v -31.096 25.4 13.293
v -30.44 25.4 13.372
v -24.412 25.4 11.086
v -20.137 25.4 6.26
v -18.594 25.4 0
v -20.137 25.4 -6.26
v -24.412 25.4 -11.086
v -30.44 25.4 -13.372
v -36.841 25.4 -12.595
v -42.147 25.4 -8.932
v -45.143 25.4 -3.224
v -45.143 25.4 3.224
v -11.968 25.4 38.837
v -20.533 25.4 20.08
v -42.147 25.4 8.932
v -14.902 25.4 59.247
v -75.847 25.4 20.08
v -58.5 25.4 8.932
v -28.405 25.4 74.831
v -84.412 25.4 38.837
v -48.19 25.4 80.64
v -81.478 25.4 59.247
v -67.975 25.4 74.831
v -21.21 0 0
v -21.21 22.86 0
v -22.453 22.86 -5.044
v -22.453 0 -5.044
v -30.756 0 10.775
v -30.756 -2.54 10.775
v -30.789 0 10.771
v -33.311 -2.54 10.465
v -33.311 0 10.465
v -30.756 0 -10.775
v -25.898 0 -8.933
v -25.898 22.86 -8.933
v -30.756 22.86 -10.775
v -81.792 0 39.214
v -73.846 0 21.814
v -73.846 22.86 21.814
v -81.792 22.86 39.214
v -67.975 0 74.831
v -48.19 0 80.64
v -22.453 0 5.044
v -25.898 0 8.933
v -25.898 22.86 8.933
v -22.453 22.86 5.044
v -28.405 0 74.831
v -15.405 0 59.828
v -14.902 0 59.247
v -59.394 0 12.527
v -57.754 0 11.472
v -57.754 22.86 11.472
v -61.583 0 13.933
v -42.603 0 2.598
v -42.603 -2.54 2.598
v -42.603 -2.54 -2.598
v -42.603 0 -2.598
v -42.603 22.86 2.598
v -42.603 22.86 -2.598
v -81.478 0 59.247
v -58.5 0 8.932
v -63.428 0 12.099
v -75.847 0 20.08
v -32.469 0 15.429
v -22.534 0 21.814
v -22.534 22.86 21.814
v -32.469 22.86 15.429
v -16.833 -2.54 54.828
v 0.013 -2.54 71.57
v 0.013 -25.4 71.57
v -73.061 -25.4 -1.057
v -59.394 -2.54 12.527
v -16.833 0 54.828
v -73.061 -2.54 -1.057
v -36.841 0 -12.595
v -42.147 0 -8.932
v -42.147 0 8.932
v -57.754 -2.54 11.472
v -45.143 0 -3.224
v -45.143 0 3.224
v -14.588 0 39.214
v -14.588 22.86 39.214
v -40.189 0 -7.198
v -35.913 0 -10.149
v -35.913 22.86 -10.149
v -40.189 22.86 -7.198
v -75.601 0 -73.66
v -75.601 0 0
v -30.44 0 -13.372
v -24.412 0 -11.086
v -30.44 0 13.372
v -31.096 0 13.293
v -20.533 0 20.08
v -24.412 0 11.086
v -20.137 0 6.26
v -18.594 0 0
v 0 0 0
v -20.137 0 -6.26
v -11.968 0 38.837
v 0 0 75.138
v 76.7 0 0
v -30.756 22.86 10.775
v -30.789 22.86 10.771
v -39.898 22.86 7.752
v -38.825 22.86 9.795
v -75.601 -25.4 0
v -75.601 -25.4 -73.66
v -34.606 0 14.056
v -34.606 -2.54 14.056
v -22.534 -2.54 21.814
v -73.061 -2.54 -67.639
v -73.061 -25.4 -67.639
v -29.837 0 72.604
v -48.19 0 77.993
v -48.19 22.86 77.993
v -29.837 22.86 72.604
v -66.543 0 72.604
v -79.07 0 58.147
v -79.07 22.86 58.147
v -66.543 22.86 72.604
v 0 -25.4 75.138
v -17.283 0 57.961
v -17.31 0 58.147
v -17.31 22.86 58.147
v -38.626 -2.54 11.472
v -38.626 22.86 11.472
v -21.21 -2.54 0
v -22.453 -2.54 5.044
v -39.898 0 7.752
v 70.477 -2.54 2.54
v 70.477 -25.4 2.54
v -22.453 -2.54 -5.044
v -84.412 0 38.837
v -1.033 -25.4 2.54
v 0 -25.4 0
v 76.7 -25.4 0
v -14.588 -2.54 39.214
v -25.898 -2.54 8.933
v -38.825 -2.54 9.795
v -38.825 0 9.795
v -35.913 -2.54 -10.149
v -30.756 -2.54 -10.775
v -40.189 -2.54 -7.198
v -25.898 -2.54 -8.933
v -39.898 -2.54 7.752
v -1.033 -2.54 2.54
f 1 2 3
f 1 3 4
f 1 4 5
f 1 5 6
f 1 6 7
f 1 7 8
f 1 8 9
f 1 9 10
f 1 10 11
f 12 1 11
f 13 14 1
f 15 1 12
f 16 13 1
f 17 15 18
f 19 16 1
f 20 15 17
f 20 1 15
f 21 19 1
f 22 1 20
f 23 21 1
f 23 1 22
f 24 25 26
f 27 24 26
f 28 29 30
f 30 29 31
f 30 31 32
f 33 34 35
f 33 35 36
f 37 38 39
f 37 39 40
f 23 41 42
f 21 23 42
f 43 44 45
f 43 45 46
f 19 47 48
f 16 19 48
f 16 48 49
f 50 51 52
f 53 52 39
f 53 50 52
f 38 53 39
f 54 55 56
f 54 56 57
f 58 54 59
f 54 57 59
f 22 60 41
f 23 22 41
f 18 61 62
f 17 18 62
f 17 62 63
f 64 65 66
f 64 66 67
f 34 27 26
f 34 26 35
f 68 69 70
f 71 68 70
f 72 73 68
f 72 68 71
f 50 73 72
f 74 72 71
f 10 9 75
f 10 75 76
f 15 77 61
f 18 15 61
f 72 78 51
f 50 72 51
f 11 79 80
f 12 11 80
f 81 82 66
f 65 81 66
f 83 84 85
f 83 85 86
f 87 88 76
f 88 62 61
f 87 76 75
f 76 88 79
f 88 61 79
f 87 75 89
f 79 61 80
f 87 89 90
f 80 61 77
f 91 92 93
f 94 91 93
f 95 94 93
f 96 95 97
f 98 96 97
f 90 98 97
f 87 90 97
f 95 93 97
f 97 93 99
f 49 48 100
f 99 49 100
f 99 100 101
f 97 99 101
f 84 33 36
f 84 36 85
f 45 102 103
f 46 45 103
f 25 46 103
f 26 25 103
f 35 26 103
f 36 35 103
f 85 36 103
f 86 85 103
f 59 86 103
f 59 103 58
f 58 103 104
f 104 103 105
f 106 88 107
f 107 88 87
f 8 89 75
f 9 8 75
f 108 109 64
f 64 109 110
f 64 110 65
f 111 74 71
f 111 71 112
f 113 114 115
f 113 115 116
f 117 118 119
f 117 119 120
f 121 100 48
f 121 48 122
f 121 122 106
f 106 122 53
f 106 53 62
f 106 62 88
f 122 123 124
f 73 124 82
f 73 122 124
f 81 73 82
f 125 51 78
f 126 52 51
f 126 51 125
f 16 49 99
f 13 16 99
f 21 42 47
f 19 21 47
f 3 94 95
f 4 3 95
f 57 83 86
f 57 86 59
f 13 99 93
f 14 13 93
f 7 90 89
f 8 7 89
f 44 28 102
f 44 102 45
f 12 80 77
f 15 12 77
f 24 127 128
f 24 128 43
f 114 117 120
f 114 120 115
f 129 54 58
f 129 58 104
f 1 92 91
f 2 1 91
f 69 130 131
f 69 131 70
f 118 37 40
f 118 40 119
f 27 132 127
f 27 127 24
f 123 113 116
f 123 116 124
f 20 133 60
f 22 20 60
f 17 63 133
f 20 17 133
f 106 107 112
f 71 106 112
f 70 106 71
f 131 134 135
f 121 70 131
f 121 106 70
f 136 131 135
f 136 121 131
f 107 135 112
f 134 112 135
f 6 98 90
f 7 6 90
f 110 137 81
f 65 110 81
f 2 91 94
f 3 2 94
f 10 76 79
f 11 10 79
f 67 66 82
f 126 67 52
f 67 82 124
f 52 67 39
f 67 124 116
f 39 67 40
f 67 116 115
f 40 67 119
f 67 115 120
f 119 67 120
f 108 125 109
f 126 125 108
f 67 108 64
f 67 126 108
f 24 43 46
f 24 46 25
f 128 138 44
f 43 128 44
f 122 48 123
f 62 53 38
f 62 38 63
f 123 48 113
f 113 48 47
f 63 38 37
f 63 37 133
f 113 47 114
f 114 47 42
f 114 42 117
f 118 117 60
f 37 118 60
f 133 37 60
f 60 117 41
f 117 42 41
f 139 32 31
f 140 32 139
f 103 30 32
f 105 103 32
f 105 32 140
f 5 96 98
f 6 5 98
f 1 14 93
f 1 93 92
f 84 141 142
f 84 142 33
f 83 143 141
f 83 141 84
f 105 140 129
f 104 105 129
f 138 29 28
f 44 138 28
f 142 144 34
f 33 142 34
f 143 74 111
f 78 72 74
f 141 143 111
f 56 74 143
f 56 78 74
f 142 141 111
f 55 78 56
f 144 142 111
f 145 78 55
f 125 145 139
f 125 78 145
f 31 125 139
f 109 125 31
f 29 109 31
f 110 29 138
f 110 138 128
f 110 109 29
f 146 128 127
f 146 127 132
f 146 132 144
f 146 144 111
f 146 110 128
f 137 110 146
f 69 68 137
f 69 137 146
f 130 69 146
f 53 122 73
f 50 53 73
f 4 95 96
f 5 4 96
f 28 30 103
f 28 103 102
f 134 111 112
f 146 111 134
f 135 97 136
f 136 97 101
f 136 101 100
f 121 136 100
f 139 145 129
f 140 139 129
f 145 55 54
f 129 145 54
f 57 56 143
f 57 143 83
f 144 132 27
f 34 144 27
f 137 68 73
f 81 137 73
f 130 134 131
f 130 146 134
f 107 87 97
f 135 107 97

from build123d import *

# Parameters (mm, degrees)
F1_DEPTH     = 25.4
F2_T         = -2.54
F4_DEPTH     = 25.4
F5_T         = 2.54
F5_T3_DEPTH  = 30.48
F5_T5_DEPTH  = 10.9375095944
F5_T7_DEPTH  = 21.4331791904
F5_T9_DEPTH  = 11.5273250997
F5_T11_DEPTH = 11.5273250997
F5_T13_DEPTH = 11.5273250997
F5_T15_DEPTH = 11.5273250997
F5_T17_DEPTH = 11.5273250997
F5_T19_DEPTH = 11.5273250997
F5_T21_DEPTH = 11.5273250997
F5_T23_DEPTH = 11.5273250997
F5_T25_DEPTH = 11.5273250997
F5_T27_DEPTH = 11.5273250997
F5_T29_DEPTH = 11.5273250997
F5_T31_DEPTH = 5.7399744024
F5_T33_DEPTH = 17.6352883916
F5_T35_DEPTH = 25.6999516571
F5_T37_DEPTH = 25.6999516571
F5_T39_DEPTH = 5.8481406641
F5_T41_DEPTH = 30.48
F5_T43_DEPTH = 27.94


# Not quite as in the source:
# - a shell that OpenCascade refuses in one call is made with other operations: the cavity is built on its own and cut out


with BuildPart() as f1:
    # F0 (on Front) → F1 (new body)
    with BuildSketch(Plane.XZ):
        Polygon((76.6998529434, 0), (0, 75.1383975148), (-75.6014883518, 0), (-75.6014883518, -73.6595392227), (0, 0), align=None)
    extrude(amount=F1_DEPTH)

    # F2
    f2_openings = [f1.faces().sort_by_distance(p)[0] for p in [
        (-16.251734, -25.4, 8.81054),
    ]]
    offset(amount=F2_T, openings=f2_openings, kind=Kind.INTERSECTION)

    # F3 (on face) → F4 (join)
    with BuildSketch(Plane(origin=(0, 0, 0), x_dir=(-1, 0, 0), z_dir=(0, 1, 0))):
        Polygon((45.1430156827, -3.2236625498), (45.1430156827, 3.2236625498), (42.1467943112, 8.9324854087), (37.8800218445, 8.9324854087), (31.0955953813, 13.2925715491), (30.4404329353, 13.3721226726), (24.4120792452, 11.0858696839), (20.1367118865, 6.2599775498), (18.5937659974, 0), (20.1367118865, -6.2599775498), (24.4120792452, -11.0858696839), (30.4404329353, -13.3721226726), (36.8407497759, -12.5949835086), (42.1467943112, -8.9324854087), align=None)
        Polygon((37.8800218445, 8.9324854087), (42.1467943112, 8.9324854087), (36.8407497759, 12.5949835086), (31.0955953813, 13.2925715491), align=None)
        Polygon((36.8407497759, 12.5949835086), (42.1467943112, 8.9324854087), (58.4999735016, 8.9324854087), (75.8465806799, 20.0804729285), (84.4124181657, 38.8370406985), (81.4778930804, 59.2471109792), (67.9746964043, 74.8306306673), (48.189997673, 80.6399423696), (28.4052989418, 74.8306306673), (14.9021022657, 59.2471109792), (11.9675771804, 38.8370406985), (20.5334146661, 20.0804729285), (31.0955953813, 13.2925715491), align=None)
    extrude(amount=F4_DEPTH)

    # F5: shell of thickness 2.54, made by hand


with BuildPart() as f5_core1:
    # F5_t2: copy of F1
    add(f1.part)

    # the walls: a layer under each face that stays
    f5_faces = [f5_core1.faces().sort_by_distance(p)[0] for p in [
        (38.3499264717, -12.7, 37.5691987574),
        (38.3499264717, -12.7, 0),
        (-37.8007441759, -12.7, 37.5691987574),
        (0.5491822958, 0, 0.7394291461),
        (0.5491822958, -25.4, 0.7394291461),
        (-37.8007441759, -12.7, -36.8297696114),
        (-75.6014883518, -12.7, -36.8297696114),
        (-67.1732770908, 12.7, 14.5064791686),
        (-50.3233839064, 12.7, 8.9324854087),
        (-43.6449049969, 12.7, 6.0780739793),
        (-45.1430156827, 12.7, 0),
        (-43.6449049969, 12.7, -6.0780739793),
        (-39.4937720436, 12.7, -10.7637344586),
        (-33.6405913556, 12.7, -12.9835530906),
        (-27.4262560902, 12.7, -12.2289961783),
        (-22.2743955659, 12.7, -8.6729236169),
        (-19.365238942, 12.7, -3.1299887749),
        (-19.365238942, 12.7, 3.1299887749),
        (-22.2743955659, 12.7, 8.6729236169),
        (-27.4262560902, 12.7, 12.2289961783),
        (-30.7680141583, 12.7, 13.3323471109),
        (-25.8145050237, 12.7, 16.6865222388),
        (-16.2504959233, 12.7, 29.4587568135),
        (-13.434839723, 12.7, 49.0420758389),
        (-21.6537006037, 12.7, 67.0388708233),
        (35.245158445, -13.97, 37.0550334809),
        (34.7223268727, -13.97, 2.54),
        (-37.0471427298, -13.97, -32.5492576556),
        (-73.0614883518, -13.97, -34.3475958286),
        (-36.5243111575, -13.97, 35.2566953079),
        (-38.2976483074, 12.7, 77.7352865185),
        (-58.0823470387, 12.7, 77.7352865185),
        (-74.7262947424, 12.7, 67.0388708233),
        (-82.945155623, 12.7, 49.0420758389),
        (-80.1294994228, 12.7, 29.4587568135),
        (-48.189997673, 25.4, 33.6339098485),
    ]]
    thicken(f5_faces, amount=-F5_T, mode=Mode.SUBTRACT)

    # F5_s4 → F5_t3 (cut)
    with BuildSketch(Plane.XZ.offset(-2.54)):
        Polygon((0.0177253382, -0.0435926464), (0, 2.54), (-1.0327971077, 2.54), (-1.7725338247, 1.8192646427), align=None)
    extrude(amount=F5_T3_DEPTH, mode=Mode.SUBTRACT)

    # F5_s6 → F5_t5 (cut)
    with BuildSketch(Plane(origin=(-43.3267236667, 0, 27.8443945691), x_dir=(0, 1, 0), z_dir=(-0.8412535328, 0, 0.5406408175))):
        Polygon((0.0254, 24.138388588), (-2.54, 24.112988588), (-2.54, 21.572988588), (0, 21.572988588), align=None)
    extrude(amount=F5_T5_DEPTH, mode=Mode.SUBTRACT)

    # F5_s8 → F5_t7 (cut)
    with BuildSketch(Plane.YZ.offset(-61.0399735016)):
        Polygon((0.0254, 8.9070854087), (-2.54, 8.9324854087), (-2.54, 11.4724854087), (0, 11.4724854087), align=None)
    extrude(amount=F5_T7_DEPTH, mode=Mode.SUBTRACT)

    # F5_s10 → F5_t9 (cut)
    with BuildSketch(Plane(origin=(-9.6033156793, 0, -18.2975892876), x_dir=(0, 1, 0), z_dir=(0.464723172, 0, 0.8854560257))):
        Polygon((0.0254, 41.4956659382), (-2.54, 41.4702659382), (-2.54, 38.9302659382), (0, 38.9302659382), align=None)
    extrude(amount=F5_T9_DEPTH, mode=Mode.SUBTRACT)

    # F5_s12 → F5_t11 (cut)
    with BuildSketch(Plane.XY.offset(-5.7636625498)):
        Polygon((-45.1684156827, 0.0254), (-45.1430156827, -2.54), (-42.6030156827, -2.54), (-42.6030156827, 0), align=None)
    extrude(amount=F5_T11_DEPTH, mode=Mode.SUBTRACT)

    # F5_s14 → F5_t13 (cut)
    with BuildSketch(Plane(origin=(-4.2463005938, 0, 8.0906498184), x_dir=(0, 1, 0), z_dir=(-0.464723172, 0, 0.8854560257))):
        Polygon((0.0254, 41.4956659382), (-2.54, 41.4702659382), (-2.54, 38.9302659382), (0, 38.9302659382), align=None)
    extrude(amount=F5_T13_DEPTH, mode=Mode.SUBTRACT)

    # F5_s16 → F5_t15 (cut)
    with BuildSketch(Plane(origin=(-16.9736937466, 0, 11.7160948578), x_dir=(0, 1, 0), z_dir=(-0.8229838659, 0, 0.5680647467))):
        Polygon((0.0254, 31.3187994096), (-2.54, 31.2933994096), (-2.54, 28.7533994096), (0, 28.7533994096), align=None)
    extrude(amount=F5_T15_DEPTH, mode=Mode.SUBTRACT)

    # F5_s18 → F5_t17 (cut)
    with BuildSketch(Plane(origin=(-25.876601356, 0, 3.1419882557), x_dir=(0, 1, 0), z_dir=(-0.9927088741, 0, 0.1205366803))):
        Polygon((0.0254, 16.9692135742), (-2.54, 16.9438135742), (-2.54, 14.4038135742), (0, 14.4038135742), align=None)
    extrude(amount=F5_T17_DEPTH, mode=Mode.SUBTRACT)

    # F5_s20 → F5_t19 (cut)
    with BuildSketch(Plane(origin=(-22.6430959031, 0, -8.5873935644), x_dir=(0, 1, 0), z_dir=(-0.9350162427, 0, -0.354604887))):
        Polygon((0.0254, 1.7342256155), (-2.54, 1.7088256155), (-2.54, -0.8311743845), (0, -0.8311743845), align=None)
    extrude(amount=F5_T19_DEPTH, mode=Mode.SUBTRACT)

    # F5_s22 → F5_t21 (cut)
    with BuildSketch(Plane(origin=(-10.277585823, 0, -11.6009962232), x_dir=(0, 1, 0), z_dir=(-0.6631226582, 0, -0.7485107482))):
        Polygon((0.0254, -10.8960123265), (-2.54, -10.9214123265), (-2.54, -13.4614123265), (0, -13.4614123265), align=None)
    extrude(amount=F5_T21_DEPTH, mode=Mode.SUBTRACT)

    # F5_s24 → F5_t23 (cut)
    with BuildSketch(Plane(origin=(-0.4570401404, 0, -1.854284741), x_dir=(0, 1, 0), z_dir=(-0.2393156643, 0, -0.9709418174))):
        Polygon((0.0254, -18.0280649503), (-2.54, -18.0534649503), (-2.54, -20.5934649503), (0, -20.5934649503), align=None)
    extrude(amount=F5_T23_DEPTH, mode=Mode.SUBTRACT)

    # F5_s26 → F5_t25 (cut)
    with BuildSketch(Plane(origin=(-3.2157096041, 0, 13.0466467234), x_dir=(0, 1, 0), z_dir=(0.2393156643, 0, -0.9709418174))):
        Polygon((0.0254, -18.0280649503), (-2.54, -18.0534649503), (-2.54, -20.5934649503), (0, -20.5934649503), align=None)
    extrude(amount=F5_T25_DEPTH, mode=Mode.SUBTRACT)

    # F5_s28 → F5_t27 (cut)
    with BuildSketch(Plane(origin=(-17.9216162855, 0, 20.229322958), x_dir=(0, 1, 0), z_dir=(0.6631226582, 0, -0.7485107482))):
        Polygon((0.0254, -10.8960123265), (-2.54, -10.9214123265), (-2.54, -13.4614123265), (0, -13.4614123265), align=None)
    extrude(amount=F5_T27_DEPTH, mode=Mode.SUBTRACT)

    # F5_s30 → F5_t29 (cut)
    with BuildSketch(Plane(origin=(-33.4213321061, 0, 12.6750393793), x_dir=(0, 1, 0), z_dir=(0.9350162427, 0, -0.354604887))):
        Polygon((0.0254, 1.7342256155), (-2.54, 1.7088256155), (-2.54, -0.8311743845), (0, -0.8311743845), align=None)
    extrude(amount=F5_T29_DEPTH, mode=Mode.SUBTRACT)

    # F5_s32 → F5_t31 (cut)
    with BuildSketch(Plane(origin=(-31.5747248824, 0, -3.8338657149), x_dir=(0, 1, 0), z_dir=(0.9927088741, 0, 0.1205366803))):
        Polygon((0.0254, 16.9692135742), (-2.54, 16.9438135742), (-2.54, 14.4038135742), (0, 14.4038135742), align=None)
    extrude(amount=F5_T31_DEPTH, mode=Mode.SUBTRACT)

    # F5_s34 → F5_t33 (cut)
    with BuildSketch(Plane(origin=(-3.2619473911, 0, -2.0963262978), x_dir=(0, 1, 0), z_dir=(-0.8412535328, 0, -0.5406408175))):
        Polygon((0.0254, -27.9685708823), (-2.54, -27.9939708823), (-2.54, -30.5339708823), (0, -30.5339708823), align=None)
    extrude(amount=F5_T33_DEPTH, mode=Mode.SUBTRACT)

    # F5_s36 → F5_t35 (cut)
    with BuildSketch(Plane(origin=(13.6654522193, 0, 29.9231664254), x_dir=(0, 1, 0), z_dir=(-0.415415013, 0, -0.9096319954))):
        Polygon((0.0254, -26.9941808769), (-2.54, -27.0195808769), (-2.54, -29.5595808769), (0, -29.5595808769), align=None)
    extrude(amount=F5_T35_DEPTH, mode=Mode.SUBTRACT)

    # F5_s38 → F5_t37 (cut)
    with BuildSketch(Plane(origin=(-9.0092196449, 0, 62.6604989846), x_dir=(0, 1, 0), z_dir=(0.1423148383, 0, -0.9898214419))):
        Polygon((0.0254, -6.2932773345), (-2.54, -6.3186773345), (-2.54, -8.8586773345), (0, -8.8586773345), align=None)
    extrude(amount=F5_T37_DEPTH, mode=Mode.SUBTRACT)

    # F5_s40 → F5_t39 (cut)
    with BuildSketch(Plane(origin=(-37.8790578276, 0, 43.7147630729), x_dir=(0, 1, 0), z_dir=(0.6548607339, 0, -0.7557495744))):
        Polygon((0.0254, 27.5617491357), (-2.54, 27.5363491357), (-2.54, 24.9963491357), (0, 24.9963491357), align=None)
    extrude(amount=F5_T39_DEPTH, mode=Mode.SUBTRACT)

    # F5_s42 → F5_t41 (cut)
    with BuildSketch(Plane.XZ.offset(-27.94)):
        Polygon((-42.1692848942, 8.9188893773), (-42.1467943112, 11.4724854087), (-37.9451211064, 11.4724854087), (-39.897736006, 7.7520885517), align=None)
        Polygon((-31.0849247362, 13.2964185148), (-30.7894322134, 10.7710910089), (-41.7969422831, 9.4345373059), (-32.4688230576, 15.4293555225), align=None)
    extrude(amount=F5_T41_DEPTH, mode=Mode.SUBTRACT)

    # F5_s44 → F5_t43 (cut)
    with BuildSketch(Plane.XZ):
        Polygon((70.4596759808, 2.5472557471), (72.254938082, 4.3544252949), (76.6998529434, 0), (70.4774508531, 0), align=None)
        Polygon((0.0129964155, 71.5339071047), (1.7903532658, 73.3844922566), (0, 75.1383975148), (-1.7776590552, 73.3716273672), align=None)
        Polygon((-73.0538136901, -67.6203226649), (-71.2889545271, -69.457779954), (-75.6014883518, -73.6595392227), (-75.6014883518, -67.6385153113), align=None)
        Polygon((-73.0181831009, -1.0746919499), (-75.6014883518, -1.0566763458), (-75.6014883518, 0), (-74.8520134439, 0.7448840596), align=None)
    extrude(amount=F5_T43_DEPTH, mode=Mode.SUBTRACT)


with BuildPart() as f1_1:
    add(f1.part)

    # what is left inside the walls is the cavity
    f5_cavity = [f5_core1.part.solids().sort_by_distance(p)[0] for p in [
        (-48.189998, 22.8346, 33.645894),
        (-31.906399, 22.8346, -3.591727),
    ]]
    add(f5_cavity, mode=Mode.SUBTRACT)


solid = f1_1.part
